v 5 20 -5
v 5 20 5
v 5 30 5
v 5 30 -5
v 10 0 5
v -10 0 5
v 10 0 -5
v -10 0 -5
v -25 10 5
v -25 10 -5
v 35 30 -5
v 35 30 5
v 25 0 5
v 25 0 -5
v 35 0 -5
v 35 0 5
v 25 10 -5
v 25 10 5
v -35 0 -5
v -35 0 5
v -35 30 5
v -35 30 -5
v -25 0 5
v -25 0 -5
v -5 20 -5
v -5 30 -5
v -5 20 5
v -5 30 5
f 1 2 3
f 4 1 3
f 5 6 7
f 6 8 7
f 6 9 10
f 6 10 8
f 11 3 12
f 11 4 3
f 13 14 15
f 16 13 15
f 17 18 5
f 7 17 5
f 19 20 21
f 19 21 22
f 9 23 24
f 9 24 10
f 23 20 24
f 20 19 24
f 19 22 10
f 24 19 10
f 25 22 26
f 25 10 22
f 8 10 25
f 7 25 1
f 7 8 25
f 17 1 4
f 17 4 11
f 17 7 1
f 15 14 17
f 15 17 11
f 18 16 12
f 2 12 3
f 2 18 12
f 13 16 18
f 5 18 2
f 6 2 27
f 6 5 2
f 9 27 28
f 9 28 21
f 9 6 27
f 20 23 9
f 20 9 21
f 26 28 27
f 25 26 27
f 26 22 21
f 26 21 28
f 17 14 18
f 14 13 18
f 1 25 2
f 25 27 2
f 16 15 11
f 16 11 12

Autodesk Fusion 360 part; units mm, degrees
sketch "Sketch1" plane through (0, 0, 0) normal (0, 1, 0) x (1, 0, 0)
  line L0 (35, -5) -> (-35, -5)
  line L1 (-35, -5) -> (-35, 5)
  line L2 (-35, 5) -> (35, 5)
  line L3 (35, 5) -> (35, -5)
  line L4 (35, -5) -> (-35, 5) construction
  line L5 (-35, -5) -> (35, 5) construction
  dimension "d1" = 70
  dimension "d2" = 10
extrude "Extrude1" add sketch "Sketch1" along normal blind 30
sketch "Sketch2" plane through (0, 0, 5) normal (0, 0, 1) x (1, 0, 0)
  line L0 (-35, 0) -> (35, 0)
  line L1 (35, 0) -> (35, 30)
  line L2 (35, 30) -> (-35, 30)
  line L3 (-35, 30) -> (-35, 0)
  line L4 (0, 30) -> (-5, 30)
  line L5 (0, 30) -> (5, 30)
  line L6 (-25, 0) -> (-25, 10)
  line L7 (-25, 10) -> (-10, 0)
  line L8 (25, 0) -> (25, 10)
  line L9 (25, 10) -> (10, 0)
  line L10 (-25, 0) -> (-10, 0)
  line L11 (10, 0) -> (25, 0)
  line L12 (-5, 30) -> (-5, 20)
  line L13 (-5, 20) -> (5, 20)
  line L14 (5, 20) -> (5, 30)
  line L15 (-35, 30) -> (-35, 0)
  line L16 (-25, 0) -> (-35, 0)
  line L17 (-35, 30) -> (35, 30)
  line L18 (35, 30) -> (35, 0)
  line L19 (35, 0) -> (-10, 0)
  dimension "d5" = 5
  dimension "d6" = 5
  dimension "d7" = 10
  dimension "d8" = 10
  dimension "d9" = 10
  dimension "d10" = 15
  dimension "d13" = 10
extrude "Extrude2" cut sketch "Sketch2" against normal blind 10 contours L0 L6 L7 L10 | L2 L4 L5 L12 L13 L14 L17 | L0 L8 L9 L11 L19
